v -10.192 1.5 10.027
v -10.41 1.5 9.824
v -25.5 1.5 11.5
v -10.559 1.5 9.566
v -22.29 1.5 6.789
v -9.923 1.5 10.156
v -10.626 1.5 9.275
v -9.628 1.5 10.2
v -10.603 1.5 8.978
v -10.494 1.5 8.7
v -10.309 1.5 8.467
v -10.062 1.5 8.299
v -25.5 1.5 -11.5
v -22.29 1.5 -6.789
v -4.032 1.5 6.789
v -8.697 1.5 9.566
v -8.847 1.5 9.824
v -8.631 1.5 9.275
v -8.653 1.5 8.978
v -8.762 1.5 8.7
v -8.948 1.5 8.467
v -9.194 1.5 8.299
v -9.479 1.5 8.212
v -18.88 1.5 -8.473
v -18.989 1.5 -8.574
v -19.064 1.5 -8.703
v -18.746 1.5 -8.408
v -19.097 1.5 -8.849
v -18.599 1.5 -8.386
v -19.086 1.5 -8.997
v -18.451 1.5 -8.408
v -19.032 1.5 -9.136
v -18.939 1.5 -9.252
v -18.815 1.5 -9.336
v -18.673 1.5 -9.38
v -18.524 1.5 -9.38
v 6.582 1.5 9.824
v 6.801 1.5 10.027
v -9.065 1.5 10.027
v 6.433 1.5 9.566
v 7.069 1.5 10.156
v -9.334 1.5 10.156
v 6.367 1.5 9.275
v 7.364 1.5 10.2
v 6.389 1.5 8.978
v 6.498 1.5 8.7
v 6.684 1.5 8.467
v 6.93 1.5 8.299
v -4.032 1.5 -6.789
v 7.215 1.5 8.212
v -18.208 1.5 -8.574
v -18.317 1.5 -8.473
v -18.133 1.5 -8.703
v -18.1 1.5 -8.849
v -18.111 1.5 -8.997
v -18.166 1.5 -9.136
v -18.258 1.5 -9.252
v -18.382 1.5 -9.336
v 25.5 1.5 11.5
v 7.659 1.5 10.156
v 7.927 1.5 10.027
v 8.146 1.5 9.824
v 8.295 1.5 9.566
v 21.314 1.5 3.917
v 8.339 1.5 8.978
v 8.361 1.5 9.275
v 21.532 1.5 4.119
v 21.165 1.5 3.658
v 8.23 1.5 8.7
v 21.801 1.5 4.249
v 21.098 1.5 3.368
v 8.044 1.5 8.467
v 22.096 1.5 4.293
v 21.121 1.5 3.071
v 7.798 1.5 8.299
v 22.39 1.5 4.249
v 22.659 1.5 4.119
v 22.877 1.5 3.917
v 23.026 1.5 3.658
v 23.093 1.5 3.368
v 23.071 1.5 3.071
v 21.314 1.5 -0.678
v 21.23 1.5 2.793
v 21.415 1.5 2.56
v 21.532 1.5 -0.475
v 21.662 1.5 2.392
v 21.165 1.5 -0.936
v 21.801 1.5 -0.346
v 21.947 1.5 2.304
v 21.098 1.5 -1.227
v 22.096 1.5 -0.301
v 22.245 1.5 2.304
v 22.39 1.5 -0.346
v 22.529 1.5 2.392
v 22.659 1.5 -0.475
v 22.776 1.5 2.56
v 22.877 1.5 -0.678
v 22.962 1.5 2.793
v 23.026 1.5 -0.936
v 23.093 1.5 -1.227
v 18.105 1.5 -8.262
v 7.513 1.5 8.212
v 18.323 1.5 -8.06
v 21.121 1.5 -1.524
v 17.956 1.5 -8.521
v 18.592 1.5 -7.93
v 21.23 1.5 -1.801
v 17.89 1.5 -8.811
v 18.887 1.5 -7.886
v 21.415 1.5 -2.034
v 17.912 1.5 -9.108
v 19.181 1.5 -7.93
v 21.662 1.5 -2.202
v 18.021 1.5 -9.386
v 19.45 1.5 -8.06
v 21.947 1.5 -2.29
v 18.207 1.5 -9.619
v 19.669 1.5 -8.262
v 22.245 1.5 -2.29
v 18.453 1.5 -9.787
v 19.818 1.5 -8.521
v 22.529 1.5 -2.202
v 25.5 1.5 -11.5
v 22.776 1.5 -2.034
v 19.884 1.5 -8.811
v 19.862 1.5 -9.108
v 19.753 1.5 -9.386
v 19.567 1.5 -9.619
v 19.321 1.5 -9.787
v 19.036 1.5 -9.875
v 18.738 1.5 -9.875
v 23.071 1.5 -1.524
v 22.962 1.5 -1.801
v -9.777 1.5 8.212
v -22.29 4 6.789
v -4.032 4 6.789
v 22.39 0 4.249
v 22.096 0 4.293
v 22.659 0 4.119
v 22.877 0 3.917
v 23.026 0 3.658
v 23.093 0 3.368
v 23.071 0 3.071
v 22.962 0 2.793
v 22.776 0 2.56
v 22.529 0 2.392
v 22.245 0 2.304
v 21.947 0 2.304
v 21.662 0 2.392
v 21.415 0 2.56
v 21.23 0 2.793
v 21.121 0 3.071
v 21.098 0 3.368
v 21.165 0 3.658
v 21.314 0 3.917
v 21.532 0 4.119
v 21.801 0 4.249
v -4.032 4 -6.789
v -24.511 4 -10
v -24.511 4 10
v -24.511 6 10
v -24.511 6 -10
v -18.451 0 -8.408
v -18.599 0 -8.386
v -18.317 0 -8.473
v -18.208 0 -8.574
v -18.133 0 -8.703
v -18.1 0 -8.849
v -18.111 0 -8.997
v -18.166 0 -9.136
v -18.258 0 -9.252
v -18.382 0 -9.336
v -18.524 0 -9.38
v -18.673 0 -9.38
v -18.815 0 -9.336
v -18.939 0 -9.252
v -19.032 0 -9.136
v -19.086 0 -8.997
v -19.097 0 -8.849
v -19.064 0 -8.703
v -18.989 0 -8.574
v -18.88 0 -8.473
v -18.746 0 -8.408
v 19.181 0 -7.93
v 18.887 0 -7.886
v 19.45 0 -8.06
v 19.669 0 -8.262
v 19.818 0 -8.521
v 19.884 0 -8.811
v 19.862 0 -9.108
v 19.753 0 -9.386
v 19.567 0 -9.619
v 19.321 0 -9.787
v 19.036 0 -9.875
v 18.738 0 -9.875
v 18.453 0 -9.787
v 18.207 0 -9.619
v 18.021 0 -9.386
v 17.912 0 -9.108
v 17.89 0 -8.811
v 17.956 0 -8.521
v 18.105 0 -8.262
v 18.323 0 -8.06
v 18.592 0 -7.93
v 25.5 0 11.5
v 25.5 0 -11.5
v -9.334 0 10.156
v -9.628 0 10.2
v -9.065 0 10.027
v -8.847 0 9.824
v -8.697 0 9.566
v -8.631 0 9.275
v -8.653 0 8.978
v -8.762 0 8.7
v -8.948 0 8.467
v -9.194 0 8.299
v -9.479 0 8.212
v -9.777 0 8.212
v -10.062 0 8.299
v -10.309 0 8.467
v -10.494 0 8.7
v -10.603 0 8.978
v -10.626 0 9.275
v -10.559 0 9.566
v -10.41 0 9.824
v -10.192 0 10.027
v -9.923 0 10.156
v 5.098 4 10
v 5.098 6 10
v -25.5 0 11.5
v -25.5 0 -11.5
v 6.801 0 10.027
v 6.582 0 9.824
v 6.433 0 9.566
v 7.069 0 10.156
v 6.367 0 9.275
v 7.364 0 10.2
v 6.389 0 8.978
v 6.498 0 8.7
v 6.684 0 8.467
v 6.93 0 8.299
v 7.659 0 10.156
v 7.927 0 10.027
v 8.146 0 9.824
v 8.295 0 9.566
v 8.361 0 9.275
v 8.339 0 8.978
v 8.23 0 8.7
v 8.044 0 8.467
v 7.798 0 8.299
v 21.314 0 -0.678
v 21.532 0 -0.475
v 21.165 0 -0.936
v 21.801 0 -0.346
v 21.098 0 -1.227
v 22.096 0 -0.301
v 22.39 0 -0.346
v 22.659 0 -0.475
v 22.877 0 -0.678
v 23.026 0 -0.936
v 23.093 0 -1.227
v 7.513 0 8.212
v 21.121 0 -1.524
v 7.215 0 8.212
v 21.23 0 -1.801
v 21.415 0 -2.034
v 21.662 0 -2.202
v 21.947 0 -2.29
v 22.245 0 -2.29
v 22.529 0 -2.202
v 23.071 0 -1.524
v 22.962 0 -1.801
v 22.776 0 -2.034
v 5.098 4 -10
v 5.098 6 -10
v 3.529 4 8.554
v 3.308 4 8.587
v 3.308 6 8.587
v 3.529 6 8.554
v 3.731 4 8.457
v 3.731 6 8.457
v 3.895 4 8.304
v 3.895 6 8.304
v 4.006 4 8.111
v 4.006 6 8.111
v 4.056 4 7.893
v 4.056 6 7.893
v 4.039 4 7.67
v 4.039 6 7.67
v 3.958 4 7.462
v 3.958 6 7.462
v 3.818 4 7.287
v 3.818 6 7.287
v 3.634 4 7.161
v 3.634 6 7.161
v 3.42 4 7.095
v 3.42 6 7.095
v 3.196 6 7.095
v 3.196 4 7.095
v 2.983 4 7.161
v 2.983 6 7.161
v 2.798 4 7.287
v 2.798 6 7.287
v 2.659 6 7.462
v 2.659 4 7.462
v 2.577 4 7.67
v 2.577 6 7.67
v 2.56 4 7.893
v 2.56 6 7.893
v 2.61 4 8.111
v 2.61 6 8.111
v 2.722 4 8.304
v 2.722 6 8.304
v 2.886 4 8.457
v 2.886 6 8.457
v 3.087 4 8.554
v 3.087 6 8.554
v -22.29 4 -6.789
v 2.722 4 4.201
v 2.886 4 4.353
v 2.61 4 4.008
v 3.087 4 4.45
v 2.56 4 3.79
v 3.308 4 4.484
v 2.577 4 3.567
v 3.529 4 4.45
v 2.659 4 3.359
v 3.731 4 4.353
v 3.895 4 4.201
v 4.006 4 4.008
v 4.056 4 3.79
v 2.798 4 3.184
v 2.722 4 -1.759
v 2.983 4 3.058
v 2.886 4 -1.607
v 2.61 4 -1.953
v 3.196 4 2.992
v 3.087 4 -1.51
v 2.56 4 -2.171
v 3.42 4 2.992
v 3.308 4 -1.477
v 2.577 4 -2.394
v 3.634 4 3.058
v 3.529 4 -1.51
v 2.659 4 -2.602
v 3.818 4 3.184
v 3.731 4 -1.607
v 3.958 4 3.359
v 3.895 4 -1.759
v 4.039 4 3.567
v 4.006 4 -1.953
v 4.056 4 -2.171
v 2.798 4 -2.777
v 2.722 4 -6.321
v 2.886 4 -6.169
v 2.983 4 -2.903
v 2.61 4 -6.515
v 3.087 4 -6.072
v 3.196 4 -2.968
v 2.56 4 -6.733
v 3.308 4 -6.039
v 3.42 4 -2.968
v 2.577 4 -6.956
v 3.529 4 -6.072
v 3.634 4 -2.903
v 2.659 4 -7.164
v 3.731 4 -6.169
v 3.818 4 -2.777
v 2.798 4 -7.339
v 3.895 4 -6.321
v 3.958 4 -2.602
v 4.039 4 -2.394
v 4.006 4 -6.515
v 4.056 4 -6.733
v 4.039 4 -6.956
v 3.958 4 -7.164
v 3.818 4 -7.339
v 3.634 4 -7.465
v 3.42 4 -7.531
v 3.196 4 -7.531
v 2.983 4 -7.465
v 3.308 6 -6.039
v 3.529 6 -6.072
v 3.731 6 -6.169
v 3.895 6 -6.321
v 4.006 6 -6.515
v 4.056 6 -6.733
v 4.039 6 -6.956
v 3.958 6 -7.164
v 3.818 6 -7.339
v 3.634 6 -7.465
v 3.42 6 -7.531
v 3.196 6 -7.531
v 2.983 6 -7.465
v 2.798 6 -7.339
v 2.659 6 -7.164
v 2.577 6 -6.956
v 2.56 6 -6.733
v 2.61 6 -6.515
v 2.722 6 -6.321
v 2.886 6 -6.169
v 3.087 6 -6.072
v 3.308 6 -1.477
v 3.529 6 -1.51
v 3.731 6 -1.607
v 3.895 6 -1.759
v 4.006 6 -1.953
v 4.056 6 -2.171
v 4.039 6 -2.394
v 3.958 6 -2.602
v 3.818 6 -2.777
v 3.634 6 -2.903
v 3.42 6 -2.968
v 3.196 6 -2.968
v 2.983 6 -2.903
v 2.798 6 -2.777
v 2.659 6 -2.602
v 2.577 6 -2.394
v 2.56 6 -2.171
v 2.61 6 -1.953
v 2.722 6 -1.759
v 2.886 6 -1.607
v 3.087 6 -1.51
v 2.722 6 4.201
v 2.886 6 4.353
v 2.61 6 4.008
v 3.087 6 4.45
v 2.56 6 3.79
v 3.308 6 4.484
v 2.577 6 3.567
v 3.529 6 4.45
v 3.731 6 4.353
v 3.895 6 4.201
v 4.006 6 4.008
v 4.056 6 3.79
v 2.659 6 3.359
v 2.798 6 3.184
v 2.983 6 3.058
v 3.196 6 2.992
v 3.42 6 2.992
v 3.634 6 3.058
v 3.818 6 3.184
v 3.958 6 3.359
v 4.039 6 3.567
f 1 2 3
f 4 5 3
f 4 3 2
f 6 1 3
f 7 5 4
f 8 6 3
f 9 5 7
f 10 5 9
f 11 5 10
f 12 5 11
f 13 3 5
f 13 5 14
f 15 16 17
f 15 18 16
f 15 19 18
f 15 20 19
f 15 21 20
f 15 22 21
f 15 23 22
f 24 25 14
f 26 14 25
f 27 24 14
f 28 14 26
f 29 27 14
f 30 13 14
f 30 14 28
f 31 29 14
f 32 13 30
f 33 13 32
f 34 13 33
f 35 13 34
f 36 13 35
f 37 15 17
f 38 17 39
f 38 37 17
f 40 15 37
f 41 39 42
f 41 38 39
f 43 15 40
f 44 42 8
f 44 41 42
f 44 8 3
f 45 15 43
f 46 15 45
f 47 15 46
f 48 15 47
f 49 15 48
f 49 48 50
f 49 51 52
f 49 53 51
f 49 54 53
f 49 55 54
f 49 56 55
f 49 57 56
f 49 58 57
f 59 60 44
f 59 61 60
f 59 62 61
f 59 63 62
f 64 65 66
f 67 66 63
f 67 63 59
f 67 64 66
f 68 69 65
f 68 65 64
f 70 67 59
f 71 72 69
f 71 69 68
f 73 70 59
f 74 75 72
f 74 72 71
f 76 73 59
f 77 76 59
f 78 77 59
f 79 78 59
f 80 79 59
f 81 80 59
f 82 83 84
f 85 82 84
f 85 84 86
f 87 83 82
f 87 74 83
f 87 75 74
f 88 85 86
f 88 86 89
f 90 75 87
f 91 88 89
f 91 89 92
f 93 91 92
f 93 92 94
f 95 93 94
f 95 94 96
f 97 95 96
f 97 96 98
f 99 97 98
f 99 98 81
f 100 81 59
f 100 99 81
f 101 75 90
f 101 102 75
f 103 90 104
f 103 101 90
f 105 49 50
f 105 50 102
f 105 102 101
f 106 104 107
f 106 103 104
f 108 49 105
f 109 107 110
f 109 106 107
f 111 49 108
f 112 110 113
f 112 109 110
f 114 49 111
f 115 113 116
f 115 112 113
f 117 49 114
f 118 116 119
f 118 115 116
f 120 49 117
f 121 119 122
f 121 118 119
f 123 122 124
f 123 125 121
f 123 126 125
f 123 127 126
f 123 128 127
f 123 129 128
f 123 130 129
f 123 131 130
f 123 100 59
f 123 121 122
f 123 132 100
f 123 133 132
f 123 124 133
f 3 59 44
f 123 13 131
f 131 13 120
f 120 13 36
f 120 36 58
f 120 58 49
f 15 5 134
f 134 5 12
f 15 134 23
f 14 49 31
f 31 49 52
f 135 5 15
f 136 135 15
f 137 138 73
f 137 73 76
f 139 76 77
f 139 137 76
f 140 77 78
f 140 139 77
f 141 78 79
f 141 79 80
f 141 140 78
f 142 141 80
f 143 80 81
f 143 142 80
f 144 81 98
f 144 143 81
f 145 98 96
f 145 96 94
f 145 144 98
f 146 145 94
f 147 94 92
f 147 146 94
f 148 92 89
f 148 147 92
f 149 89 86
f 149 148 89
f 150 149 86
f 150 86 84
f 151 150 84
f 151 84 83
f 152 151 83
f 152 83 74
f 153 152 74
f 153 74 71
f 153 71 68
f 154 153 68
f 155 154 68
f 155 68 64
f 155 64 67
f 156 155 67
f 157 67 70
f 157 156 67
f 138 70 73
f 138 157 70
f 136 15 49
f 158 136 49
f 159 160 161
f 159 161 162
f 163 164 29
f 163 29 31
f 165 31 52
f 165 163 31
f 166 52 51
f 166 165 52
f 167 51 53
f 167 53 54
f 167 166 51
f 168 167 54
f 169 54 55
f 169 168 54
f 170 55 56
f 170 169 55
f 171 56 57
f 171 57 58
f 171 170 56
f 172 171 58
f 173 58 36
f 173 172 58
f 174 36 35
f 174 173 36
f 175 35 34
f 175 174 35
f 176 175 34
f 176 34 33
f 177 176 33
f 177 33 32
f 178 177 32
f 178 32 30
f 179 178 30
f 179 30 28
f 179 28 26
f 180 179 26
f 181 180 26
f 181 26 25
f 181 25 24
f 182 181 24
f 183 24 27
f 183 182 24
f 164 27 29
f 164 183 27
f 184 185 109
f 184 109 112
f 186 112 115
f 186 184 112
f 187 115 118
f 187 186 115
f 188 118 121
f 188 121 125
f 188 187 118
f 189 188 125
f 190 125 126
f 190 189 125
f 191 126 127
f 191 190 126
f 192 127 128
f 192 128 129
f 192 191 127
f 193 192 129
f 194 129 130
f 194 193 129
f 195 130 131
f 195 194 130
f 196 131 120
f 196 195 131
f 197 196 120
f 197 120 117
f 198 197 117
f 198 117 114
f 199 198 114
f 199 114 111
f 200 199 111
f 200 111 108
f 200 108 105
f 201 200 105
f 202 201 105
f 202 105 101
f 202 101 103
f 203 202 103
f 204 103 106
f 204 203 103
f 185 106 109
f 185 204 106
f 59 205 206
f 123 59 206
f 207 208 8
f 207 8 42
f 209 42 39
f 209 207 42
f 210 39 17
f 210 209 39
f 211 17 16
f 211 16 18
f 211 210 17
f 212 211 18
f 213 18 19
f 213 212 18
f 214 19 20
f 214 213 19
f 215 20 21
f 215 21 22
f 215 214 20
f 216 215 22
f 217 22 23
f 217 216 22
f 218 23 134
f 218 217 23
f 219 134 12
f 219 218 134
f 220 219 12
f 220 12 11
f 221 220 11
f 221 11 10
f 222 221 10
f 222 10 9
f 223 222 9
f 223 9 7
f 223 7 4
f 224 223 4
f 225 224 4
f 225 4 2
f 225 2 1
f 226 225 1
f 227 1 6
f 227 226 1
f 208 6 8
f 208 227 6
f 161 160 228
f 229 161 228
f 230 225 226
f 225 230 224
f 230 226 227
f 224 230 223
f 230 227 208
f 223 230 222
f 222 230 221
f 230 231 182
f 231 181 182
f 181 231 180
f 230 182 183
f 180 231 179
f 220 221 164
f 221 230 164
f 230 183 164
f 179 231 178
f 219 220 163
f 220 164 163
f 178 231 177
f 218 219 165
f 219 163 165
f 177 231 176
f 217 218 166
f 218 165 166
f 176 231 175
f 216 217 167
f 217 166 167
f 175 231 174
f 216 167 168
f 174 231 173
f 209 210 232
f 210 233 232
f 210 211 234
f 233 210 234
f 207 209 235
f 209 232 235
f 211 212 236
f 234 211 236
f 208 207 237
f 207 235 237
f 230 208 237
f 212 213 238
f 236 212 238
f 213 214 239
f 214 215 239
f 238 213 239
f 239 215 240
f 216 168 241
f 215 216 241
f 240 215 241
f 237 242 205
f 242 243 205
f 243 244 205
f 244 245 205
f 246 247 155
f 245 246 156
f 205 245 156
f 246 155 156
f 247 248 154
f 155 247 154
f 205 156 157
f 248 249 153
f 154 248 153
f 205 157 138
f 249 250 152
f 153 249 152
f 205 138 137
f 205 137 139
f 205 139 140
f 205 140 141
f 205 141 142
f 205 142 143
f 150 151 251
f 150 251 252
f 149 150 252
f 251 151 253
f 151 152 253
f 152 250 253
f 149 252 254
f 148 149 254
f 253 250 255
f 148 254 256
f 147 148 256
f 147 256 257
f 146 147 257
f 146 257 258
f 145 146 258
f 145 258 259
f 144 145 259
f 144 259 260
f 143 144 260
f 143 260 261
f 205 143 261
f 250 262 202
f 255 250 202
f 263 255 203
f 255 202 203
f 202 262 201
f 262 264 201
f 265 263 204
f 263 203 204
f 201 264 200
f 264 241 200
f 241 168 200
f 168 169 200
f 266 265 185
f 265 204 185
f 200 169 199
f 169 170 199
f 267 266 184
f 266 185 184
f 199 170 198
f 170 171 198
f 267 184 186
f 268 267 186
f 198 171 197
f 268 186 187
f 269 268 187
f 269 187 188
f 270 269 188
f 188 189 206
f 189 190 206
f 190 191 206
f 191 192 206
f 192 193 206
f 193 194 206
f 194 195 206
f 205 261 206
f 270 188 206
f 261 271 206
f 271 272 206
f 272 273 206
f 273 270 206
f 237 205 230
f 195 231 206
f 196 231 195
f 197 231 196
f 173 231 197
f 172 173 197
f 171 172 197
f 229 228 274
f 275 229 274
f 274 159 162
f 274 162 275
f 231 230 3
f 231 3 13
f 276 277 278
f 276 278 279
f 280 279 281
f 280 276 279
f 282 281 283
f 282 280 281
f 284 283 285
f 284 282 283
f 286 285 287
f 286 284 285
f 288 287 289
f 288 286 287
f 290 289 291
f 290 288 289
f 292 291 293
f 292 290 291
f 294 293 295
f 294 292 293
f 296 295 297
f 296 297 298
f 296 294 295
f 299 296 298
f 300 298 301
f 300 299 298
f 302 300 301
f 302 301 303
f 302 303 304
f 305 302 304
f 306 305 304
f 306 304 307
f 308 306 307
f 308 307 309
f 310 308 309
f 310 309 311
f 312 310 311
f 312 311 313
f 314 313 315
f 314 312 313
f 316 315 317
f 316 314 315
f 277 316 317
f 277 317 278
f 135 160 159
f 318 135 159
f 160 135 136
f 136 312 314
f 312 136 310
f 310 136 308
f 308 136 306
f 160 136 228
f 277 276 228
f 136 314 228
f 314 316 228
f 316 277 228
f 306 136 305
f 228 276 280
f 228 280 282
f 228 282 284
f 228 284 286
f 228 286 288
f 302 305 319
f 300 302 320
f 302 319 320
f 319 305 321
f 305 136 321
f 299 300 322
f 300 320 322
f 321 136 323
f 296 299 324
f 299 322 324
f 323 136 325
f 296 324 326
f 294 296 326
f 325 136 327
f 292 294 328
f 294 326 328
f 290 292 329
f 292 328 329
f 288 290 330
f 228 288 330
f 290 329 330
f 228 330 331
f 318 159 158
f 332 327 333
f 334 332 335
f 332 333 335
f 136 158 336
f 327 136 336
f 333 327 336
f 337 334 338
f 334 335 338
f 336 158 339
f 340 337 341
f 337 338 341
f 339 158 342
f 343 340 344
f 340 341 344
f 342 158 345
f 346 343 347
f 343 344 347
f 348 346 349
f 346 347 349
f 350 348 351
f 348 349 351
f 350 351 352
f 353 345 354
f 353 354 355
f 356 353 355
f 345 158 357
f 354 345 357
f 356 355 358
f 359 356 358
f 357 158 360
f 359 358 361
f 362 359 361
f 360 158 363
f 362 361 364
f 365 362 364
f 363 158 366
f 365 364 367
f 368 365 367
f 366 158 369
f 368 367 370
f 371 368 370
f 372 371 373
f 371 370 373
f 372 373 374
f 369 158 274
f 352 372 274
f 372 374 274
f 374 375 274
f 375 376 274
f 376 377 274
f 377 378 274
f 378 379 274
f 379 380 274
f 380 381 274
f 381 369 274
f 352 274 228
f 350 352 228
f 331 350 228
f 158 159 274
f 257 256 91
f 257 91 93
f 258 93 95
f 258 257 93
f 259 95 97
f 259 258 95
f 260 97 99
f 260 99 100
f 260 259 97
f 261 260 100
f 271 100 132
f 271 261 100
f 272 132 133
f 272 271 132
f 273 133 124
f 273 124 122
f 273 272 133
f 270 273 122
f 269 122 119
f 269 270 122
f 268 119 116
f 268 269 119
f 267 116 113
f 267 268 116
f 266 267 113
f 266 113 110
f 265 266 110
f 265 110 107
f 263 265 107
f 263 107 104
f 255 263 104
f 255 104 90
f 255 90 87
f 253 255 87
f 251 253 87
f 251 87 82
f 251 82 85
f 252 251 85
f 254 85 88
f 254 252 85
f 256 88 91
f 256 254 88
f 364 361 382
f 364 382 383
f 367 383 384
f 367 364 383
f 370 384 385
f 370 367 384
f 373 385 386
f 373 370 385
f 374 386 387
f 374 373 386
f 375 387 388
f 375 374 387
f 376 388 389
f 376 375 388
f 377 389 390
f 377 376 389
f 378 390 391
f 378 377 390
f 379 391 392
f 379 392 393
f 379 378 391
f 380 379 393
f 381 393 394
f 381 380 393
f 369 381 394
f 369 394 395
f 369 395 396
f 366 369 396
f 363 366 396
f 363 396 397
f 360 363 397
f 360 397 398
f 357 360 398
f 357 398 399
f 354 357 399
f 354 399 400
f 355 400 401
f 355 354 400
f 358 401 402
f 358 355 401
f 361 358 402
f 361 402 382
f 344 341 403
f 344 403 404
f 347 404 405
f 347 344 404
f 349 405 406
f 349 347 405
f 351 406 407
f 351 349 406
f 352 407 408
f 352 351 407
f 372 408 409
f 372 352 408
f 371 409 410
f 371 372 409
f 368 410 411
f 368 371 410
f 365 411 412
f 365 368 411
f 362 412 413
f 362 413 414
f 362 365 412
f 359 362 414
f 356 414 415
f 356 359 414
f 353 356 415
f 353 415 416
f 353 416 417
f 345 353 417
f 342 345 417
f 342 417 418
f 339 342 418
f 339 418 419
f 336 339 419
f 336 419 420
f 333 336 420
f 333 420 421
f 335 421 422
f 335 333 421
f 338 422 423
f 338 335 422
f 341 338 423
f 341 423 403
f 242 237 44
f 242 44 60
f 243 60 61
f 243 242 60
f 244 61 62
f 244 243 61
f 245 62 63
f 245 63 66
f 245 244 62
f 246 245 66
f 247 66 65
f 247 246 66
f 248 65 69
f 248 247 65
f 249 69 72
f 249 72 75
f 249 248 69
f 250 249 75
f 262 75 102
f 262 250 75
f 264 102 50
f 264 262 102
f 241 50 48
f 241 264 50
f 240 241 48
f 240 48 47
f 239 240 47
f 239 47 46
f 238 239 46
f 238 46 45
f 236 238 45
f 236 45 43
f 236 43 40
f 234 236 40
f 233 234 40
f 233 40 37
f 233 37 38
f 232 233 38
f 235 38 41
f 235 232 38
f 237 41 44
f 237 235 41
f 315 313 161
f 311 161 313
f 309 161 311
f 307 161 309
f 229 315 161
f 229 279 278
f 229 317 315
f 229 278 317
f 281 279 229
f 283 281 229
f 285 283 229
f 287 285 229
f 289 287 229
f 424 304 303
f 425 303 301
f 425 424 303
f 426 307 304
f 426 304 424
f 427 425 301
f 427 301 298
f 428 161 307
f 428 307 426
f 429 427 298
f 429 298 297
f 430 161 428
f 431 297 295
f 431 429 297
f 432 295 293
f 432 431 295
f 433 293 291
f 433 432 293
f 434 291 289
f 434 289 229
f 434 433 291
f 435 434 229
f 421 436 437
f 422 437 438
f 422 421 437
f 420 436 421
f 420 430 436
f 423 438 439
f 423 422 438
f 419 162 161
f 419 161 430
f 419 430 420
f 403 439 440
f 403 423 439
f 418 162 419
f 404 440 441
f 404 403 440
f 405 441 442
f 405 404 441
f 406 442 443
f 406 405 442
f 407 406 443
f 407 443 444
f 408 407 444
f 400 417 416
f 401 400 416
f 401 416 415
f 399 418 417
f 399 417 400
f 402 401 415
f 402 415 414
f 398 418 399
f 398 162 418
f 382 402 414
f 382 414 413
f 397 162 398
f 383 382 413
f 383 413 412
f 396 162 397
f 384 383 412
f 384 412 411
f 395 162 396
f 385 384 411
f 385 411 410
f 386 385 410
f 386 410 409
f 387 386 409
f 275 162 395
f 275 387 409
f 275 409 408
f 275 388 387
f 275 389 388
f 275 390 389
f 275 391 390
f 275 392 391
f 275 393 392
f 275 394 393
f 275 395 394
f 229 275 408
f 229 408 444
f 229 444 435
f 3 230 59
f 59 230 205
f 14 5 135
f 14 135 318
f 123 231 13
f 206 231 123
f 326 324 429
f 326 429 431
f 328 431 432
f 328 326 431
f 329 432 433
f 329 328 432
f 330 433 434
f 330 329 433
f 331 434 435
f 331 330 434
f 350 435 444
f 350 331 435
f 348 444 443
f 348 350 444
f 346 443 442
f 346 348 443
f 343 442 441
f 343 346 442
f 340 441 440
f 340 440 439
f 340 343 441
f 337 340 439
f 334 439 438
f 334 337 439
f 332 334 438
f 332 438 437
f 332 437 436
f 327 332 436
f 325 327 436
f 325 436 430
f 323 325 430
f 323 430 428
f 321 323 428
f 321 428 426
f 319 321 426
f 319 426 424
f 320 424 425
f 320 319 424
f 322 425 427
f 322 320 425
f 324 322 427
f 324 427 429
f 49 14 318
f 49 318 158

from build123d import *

# Parameters (mm, degrees)
SKETCH_1_W      = 51
SKETCH_1_H      = 23
SKETCH_1_R      = 0.5
SKETCH_1_R_2    = 1
EXTRUDE_1_DEPTH = 1.5
SKETCH_2_W      = 18.258727374
SKETCH_2_H      = 13.578190662
EXTRUDE_2_DEPTH = 2.5
SKETCH_3_W      = 29.608747094
SKETCH_3_H      = 20
SKETCH_3_R      = 0.75
EXTRUDE_3_DEPTH = 2


with BuildPart() as part:
    # Эскиз1 → Бобышка-Вытянуть1 (new body)
    with BuildSketch(Plane(origin=(0, 0, 0), x_dir=(1, 0, 0), z_dir=(0, 1, 0))):
        Rectangle(SKETCH_1_W, SKETCH_1_H)
        with Locations(Location((-18.598557526, 8.885912105, 0), (0, 0, 270))):
            Circle(SKETCH_1_R, mode=Mode.SUBTRACT)
        with Locations(Location((18.886719194, 8.885912105, 0), (0, 0, 270))):
            Circle(SKETCH_1_R_2, mode=Mode.SUBTRACT)
        with Locations(Location((22.095575567, -3.293156401, 0), (0, 0, 270))):
            Circle(SKETCH_1_R_2, mode=Mode.SUBTRACT)
        with Locations(Location((22.095575567, 1.301342497, 0), (0, 0, 270))):
            Circle(SKETCH_1_R_2, mode=Mode.SUBTRACT)
        with Locations(Location((7.364007673, -9.200369269, 0), (0, 0, 270))):
            Circle(SKETCH_1_R_2, mode=Mode.SUBTRACT)
        with Locations(Location((-9.628345393, -9.200369269, 0), (0, 0, 270))):
            Circle(SKETCH_1_R_2, mode=Mode.SUBTRACT)
    extrude(amount=EXTRUDE_1_DEPTH)

    # Эскиз2 → Бобышка-Вытянуть2 (add)
    with BuildSketch(Plane(origin=(0, 1.5, 0), x_dir=(1, 0, 0), z_dir=(0, 1, 0))):
        with Locations((-13.161113133, 0)):
            Rectangle(SKETCH_2_W, SKETCH_2_H)
    extrude(amount=EXTRUDE_2_DEPTH)

    # Эскиз3 → Бобышка-Вытянуть3 (add)
    with BuildSketch(Plane(origin=(0, 4, 0), x_dir=(1, 0, 0), z_dir=(0, 1, 0))):
        with Locations((-9.706759305, 0)):
            Rectangle(SKETCH_3_W, SKETCH_3_H)
        with Locations(Location((3.308209816, -7.836846056, 0), (0, 0, 270))):
            Circle(SKETCH_3_R, mode=Mode.SUBTRACT)
        with Locations(Location((3.308209816, -3.733593915, 0), (0, 0, 270))):
            Circle(SKETCH_3_R, mode=Mode.SUBTRACT)
        Polygon((-4.031749446, 0), (-4.031749446, -6.789095331), (-22.29047682, -6.789095331), (-22.29047682, 6.789095331), (-4.031749446, 6.789095331), align=None, mode=Mode.SUBTRACT)
        with Locations(Location((3.308209816, 2.226781891, 0), (0, 0, 270))):
            Circle(SKETCH_3_R, mode=Mode.SUBTRACT)
        with Locations(Location((3.308209816, 6.789095331, 0), (0, 0, 270))):
            Circle(SKETCH_3_R, mode=Mode.SUBTRACT)
        Polygon((-22.29047682, 6.789095331), (-13.161113133, 0), (-4.031749446, 6.789095331), align=None)
        Polygon((-22.29047682, 6.789095331), (-22.29047682, -6.789095331), (-13.161113133, 0), align=None)
        Polygon((-22.29047682, -6.789095331), (-4.031749446, -6.789095331), (-13.161113133, 0), align=None)
        Polygon((-13.161113133, 0), (-4.031749446, -6.789095331), (-4.031749446, 0), align=None)
        Polygon((-4.031749446, 6.789095331), (-13.161113133, 0), (-4.031749446, 0), align=None)
    extrude(amount=EXTRUDE_3_DEPTH)


solid = part.part
